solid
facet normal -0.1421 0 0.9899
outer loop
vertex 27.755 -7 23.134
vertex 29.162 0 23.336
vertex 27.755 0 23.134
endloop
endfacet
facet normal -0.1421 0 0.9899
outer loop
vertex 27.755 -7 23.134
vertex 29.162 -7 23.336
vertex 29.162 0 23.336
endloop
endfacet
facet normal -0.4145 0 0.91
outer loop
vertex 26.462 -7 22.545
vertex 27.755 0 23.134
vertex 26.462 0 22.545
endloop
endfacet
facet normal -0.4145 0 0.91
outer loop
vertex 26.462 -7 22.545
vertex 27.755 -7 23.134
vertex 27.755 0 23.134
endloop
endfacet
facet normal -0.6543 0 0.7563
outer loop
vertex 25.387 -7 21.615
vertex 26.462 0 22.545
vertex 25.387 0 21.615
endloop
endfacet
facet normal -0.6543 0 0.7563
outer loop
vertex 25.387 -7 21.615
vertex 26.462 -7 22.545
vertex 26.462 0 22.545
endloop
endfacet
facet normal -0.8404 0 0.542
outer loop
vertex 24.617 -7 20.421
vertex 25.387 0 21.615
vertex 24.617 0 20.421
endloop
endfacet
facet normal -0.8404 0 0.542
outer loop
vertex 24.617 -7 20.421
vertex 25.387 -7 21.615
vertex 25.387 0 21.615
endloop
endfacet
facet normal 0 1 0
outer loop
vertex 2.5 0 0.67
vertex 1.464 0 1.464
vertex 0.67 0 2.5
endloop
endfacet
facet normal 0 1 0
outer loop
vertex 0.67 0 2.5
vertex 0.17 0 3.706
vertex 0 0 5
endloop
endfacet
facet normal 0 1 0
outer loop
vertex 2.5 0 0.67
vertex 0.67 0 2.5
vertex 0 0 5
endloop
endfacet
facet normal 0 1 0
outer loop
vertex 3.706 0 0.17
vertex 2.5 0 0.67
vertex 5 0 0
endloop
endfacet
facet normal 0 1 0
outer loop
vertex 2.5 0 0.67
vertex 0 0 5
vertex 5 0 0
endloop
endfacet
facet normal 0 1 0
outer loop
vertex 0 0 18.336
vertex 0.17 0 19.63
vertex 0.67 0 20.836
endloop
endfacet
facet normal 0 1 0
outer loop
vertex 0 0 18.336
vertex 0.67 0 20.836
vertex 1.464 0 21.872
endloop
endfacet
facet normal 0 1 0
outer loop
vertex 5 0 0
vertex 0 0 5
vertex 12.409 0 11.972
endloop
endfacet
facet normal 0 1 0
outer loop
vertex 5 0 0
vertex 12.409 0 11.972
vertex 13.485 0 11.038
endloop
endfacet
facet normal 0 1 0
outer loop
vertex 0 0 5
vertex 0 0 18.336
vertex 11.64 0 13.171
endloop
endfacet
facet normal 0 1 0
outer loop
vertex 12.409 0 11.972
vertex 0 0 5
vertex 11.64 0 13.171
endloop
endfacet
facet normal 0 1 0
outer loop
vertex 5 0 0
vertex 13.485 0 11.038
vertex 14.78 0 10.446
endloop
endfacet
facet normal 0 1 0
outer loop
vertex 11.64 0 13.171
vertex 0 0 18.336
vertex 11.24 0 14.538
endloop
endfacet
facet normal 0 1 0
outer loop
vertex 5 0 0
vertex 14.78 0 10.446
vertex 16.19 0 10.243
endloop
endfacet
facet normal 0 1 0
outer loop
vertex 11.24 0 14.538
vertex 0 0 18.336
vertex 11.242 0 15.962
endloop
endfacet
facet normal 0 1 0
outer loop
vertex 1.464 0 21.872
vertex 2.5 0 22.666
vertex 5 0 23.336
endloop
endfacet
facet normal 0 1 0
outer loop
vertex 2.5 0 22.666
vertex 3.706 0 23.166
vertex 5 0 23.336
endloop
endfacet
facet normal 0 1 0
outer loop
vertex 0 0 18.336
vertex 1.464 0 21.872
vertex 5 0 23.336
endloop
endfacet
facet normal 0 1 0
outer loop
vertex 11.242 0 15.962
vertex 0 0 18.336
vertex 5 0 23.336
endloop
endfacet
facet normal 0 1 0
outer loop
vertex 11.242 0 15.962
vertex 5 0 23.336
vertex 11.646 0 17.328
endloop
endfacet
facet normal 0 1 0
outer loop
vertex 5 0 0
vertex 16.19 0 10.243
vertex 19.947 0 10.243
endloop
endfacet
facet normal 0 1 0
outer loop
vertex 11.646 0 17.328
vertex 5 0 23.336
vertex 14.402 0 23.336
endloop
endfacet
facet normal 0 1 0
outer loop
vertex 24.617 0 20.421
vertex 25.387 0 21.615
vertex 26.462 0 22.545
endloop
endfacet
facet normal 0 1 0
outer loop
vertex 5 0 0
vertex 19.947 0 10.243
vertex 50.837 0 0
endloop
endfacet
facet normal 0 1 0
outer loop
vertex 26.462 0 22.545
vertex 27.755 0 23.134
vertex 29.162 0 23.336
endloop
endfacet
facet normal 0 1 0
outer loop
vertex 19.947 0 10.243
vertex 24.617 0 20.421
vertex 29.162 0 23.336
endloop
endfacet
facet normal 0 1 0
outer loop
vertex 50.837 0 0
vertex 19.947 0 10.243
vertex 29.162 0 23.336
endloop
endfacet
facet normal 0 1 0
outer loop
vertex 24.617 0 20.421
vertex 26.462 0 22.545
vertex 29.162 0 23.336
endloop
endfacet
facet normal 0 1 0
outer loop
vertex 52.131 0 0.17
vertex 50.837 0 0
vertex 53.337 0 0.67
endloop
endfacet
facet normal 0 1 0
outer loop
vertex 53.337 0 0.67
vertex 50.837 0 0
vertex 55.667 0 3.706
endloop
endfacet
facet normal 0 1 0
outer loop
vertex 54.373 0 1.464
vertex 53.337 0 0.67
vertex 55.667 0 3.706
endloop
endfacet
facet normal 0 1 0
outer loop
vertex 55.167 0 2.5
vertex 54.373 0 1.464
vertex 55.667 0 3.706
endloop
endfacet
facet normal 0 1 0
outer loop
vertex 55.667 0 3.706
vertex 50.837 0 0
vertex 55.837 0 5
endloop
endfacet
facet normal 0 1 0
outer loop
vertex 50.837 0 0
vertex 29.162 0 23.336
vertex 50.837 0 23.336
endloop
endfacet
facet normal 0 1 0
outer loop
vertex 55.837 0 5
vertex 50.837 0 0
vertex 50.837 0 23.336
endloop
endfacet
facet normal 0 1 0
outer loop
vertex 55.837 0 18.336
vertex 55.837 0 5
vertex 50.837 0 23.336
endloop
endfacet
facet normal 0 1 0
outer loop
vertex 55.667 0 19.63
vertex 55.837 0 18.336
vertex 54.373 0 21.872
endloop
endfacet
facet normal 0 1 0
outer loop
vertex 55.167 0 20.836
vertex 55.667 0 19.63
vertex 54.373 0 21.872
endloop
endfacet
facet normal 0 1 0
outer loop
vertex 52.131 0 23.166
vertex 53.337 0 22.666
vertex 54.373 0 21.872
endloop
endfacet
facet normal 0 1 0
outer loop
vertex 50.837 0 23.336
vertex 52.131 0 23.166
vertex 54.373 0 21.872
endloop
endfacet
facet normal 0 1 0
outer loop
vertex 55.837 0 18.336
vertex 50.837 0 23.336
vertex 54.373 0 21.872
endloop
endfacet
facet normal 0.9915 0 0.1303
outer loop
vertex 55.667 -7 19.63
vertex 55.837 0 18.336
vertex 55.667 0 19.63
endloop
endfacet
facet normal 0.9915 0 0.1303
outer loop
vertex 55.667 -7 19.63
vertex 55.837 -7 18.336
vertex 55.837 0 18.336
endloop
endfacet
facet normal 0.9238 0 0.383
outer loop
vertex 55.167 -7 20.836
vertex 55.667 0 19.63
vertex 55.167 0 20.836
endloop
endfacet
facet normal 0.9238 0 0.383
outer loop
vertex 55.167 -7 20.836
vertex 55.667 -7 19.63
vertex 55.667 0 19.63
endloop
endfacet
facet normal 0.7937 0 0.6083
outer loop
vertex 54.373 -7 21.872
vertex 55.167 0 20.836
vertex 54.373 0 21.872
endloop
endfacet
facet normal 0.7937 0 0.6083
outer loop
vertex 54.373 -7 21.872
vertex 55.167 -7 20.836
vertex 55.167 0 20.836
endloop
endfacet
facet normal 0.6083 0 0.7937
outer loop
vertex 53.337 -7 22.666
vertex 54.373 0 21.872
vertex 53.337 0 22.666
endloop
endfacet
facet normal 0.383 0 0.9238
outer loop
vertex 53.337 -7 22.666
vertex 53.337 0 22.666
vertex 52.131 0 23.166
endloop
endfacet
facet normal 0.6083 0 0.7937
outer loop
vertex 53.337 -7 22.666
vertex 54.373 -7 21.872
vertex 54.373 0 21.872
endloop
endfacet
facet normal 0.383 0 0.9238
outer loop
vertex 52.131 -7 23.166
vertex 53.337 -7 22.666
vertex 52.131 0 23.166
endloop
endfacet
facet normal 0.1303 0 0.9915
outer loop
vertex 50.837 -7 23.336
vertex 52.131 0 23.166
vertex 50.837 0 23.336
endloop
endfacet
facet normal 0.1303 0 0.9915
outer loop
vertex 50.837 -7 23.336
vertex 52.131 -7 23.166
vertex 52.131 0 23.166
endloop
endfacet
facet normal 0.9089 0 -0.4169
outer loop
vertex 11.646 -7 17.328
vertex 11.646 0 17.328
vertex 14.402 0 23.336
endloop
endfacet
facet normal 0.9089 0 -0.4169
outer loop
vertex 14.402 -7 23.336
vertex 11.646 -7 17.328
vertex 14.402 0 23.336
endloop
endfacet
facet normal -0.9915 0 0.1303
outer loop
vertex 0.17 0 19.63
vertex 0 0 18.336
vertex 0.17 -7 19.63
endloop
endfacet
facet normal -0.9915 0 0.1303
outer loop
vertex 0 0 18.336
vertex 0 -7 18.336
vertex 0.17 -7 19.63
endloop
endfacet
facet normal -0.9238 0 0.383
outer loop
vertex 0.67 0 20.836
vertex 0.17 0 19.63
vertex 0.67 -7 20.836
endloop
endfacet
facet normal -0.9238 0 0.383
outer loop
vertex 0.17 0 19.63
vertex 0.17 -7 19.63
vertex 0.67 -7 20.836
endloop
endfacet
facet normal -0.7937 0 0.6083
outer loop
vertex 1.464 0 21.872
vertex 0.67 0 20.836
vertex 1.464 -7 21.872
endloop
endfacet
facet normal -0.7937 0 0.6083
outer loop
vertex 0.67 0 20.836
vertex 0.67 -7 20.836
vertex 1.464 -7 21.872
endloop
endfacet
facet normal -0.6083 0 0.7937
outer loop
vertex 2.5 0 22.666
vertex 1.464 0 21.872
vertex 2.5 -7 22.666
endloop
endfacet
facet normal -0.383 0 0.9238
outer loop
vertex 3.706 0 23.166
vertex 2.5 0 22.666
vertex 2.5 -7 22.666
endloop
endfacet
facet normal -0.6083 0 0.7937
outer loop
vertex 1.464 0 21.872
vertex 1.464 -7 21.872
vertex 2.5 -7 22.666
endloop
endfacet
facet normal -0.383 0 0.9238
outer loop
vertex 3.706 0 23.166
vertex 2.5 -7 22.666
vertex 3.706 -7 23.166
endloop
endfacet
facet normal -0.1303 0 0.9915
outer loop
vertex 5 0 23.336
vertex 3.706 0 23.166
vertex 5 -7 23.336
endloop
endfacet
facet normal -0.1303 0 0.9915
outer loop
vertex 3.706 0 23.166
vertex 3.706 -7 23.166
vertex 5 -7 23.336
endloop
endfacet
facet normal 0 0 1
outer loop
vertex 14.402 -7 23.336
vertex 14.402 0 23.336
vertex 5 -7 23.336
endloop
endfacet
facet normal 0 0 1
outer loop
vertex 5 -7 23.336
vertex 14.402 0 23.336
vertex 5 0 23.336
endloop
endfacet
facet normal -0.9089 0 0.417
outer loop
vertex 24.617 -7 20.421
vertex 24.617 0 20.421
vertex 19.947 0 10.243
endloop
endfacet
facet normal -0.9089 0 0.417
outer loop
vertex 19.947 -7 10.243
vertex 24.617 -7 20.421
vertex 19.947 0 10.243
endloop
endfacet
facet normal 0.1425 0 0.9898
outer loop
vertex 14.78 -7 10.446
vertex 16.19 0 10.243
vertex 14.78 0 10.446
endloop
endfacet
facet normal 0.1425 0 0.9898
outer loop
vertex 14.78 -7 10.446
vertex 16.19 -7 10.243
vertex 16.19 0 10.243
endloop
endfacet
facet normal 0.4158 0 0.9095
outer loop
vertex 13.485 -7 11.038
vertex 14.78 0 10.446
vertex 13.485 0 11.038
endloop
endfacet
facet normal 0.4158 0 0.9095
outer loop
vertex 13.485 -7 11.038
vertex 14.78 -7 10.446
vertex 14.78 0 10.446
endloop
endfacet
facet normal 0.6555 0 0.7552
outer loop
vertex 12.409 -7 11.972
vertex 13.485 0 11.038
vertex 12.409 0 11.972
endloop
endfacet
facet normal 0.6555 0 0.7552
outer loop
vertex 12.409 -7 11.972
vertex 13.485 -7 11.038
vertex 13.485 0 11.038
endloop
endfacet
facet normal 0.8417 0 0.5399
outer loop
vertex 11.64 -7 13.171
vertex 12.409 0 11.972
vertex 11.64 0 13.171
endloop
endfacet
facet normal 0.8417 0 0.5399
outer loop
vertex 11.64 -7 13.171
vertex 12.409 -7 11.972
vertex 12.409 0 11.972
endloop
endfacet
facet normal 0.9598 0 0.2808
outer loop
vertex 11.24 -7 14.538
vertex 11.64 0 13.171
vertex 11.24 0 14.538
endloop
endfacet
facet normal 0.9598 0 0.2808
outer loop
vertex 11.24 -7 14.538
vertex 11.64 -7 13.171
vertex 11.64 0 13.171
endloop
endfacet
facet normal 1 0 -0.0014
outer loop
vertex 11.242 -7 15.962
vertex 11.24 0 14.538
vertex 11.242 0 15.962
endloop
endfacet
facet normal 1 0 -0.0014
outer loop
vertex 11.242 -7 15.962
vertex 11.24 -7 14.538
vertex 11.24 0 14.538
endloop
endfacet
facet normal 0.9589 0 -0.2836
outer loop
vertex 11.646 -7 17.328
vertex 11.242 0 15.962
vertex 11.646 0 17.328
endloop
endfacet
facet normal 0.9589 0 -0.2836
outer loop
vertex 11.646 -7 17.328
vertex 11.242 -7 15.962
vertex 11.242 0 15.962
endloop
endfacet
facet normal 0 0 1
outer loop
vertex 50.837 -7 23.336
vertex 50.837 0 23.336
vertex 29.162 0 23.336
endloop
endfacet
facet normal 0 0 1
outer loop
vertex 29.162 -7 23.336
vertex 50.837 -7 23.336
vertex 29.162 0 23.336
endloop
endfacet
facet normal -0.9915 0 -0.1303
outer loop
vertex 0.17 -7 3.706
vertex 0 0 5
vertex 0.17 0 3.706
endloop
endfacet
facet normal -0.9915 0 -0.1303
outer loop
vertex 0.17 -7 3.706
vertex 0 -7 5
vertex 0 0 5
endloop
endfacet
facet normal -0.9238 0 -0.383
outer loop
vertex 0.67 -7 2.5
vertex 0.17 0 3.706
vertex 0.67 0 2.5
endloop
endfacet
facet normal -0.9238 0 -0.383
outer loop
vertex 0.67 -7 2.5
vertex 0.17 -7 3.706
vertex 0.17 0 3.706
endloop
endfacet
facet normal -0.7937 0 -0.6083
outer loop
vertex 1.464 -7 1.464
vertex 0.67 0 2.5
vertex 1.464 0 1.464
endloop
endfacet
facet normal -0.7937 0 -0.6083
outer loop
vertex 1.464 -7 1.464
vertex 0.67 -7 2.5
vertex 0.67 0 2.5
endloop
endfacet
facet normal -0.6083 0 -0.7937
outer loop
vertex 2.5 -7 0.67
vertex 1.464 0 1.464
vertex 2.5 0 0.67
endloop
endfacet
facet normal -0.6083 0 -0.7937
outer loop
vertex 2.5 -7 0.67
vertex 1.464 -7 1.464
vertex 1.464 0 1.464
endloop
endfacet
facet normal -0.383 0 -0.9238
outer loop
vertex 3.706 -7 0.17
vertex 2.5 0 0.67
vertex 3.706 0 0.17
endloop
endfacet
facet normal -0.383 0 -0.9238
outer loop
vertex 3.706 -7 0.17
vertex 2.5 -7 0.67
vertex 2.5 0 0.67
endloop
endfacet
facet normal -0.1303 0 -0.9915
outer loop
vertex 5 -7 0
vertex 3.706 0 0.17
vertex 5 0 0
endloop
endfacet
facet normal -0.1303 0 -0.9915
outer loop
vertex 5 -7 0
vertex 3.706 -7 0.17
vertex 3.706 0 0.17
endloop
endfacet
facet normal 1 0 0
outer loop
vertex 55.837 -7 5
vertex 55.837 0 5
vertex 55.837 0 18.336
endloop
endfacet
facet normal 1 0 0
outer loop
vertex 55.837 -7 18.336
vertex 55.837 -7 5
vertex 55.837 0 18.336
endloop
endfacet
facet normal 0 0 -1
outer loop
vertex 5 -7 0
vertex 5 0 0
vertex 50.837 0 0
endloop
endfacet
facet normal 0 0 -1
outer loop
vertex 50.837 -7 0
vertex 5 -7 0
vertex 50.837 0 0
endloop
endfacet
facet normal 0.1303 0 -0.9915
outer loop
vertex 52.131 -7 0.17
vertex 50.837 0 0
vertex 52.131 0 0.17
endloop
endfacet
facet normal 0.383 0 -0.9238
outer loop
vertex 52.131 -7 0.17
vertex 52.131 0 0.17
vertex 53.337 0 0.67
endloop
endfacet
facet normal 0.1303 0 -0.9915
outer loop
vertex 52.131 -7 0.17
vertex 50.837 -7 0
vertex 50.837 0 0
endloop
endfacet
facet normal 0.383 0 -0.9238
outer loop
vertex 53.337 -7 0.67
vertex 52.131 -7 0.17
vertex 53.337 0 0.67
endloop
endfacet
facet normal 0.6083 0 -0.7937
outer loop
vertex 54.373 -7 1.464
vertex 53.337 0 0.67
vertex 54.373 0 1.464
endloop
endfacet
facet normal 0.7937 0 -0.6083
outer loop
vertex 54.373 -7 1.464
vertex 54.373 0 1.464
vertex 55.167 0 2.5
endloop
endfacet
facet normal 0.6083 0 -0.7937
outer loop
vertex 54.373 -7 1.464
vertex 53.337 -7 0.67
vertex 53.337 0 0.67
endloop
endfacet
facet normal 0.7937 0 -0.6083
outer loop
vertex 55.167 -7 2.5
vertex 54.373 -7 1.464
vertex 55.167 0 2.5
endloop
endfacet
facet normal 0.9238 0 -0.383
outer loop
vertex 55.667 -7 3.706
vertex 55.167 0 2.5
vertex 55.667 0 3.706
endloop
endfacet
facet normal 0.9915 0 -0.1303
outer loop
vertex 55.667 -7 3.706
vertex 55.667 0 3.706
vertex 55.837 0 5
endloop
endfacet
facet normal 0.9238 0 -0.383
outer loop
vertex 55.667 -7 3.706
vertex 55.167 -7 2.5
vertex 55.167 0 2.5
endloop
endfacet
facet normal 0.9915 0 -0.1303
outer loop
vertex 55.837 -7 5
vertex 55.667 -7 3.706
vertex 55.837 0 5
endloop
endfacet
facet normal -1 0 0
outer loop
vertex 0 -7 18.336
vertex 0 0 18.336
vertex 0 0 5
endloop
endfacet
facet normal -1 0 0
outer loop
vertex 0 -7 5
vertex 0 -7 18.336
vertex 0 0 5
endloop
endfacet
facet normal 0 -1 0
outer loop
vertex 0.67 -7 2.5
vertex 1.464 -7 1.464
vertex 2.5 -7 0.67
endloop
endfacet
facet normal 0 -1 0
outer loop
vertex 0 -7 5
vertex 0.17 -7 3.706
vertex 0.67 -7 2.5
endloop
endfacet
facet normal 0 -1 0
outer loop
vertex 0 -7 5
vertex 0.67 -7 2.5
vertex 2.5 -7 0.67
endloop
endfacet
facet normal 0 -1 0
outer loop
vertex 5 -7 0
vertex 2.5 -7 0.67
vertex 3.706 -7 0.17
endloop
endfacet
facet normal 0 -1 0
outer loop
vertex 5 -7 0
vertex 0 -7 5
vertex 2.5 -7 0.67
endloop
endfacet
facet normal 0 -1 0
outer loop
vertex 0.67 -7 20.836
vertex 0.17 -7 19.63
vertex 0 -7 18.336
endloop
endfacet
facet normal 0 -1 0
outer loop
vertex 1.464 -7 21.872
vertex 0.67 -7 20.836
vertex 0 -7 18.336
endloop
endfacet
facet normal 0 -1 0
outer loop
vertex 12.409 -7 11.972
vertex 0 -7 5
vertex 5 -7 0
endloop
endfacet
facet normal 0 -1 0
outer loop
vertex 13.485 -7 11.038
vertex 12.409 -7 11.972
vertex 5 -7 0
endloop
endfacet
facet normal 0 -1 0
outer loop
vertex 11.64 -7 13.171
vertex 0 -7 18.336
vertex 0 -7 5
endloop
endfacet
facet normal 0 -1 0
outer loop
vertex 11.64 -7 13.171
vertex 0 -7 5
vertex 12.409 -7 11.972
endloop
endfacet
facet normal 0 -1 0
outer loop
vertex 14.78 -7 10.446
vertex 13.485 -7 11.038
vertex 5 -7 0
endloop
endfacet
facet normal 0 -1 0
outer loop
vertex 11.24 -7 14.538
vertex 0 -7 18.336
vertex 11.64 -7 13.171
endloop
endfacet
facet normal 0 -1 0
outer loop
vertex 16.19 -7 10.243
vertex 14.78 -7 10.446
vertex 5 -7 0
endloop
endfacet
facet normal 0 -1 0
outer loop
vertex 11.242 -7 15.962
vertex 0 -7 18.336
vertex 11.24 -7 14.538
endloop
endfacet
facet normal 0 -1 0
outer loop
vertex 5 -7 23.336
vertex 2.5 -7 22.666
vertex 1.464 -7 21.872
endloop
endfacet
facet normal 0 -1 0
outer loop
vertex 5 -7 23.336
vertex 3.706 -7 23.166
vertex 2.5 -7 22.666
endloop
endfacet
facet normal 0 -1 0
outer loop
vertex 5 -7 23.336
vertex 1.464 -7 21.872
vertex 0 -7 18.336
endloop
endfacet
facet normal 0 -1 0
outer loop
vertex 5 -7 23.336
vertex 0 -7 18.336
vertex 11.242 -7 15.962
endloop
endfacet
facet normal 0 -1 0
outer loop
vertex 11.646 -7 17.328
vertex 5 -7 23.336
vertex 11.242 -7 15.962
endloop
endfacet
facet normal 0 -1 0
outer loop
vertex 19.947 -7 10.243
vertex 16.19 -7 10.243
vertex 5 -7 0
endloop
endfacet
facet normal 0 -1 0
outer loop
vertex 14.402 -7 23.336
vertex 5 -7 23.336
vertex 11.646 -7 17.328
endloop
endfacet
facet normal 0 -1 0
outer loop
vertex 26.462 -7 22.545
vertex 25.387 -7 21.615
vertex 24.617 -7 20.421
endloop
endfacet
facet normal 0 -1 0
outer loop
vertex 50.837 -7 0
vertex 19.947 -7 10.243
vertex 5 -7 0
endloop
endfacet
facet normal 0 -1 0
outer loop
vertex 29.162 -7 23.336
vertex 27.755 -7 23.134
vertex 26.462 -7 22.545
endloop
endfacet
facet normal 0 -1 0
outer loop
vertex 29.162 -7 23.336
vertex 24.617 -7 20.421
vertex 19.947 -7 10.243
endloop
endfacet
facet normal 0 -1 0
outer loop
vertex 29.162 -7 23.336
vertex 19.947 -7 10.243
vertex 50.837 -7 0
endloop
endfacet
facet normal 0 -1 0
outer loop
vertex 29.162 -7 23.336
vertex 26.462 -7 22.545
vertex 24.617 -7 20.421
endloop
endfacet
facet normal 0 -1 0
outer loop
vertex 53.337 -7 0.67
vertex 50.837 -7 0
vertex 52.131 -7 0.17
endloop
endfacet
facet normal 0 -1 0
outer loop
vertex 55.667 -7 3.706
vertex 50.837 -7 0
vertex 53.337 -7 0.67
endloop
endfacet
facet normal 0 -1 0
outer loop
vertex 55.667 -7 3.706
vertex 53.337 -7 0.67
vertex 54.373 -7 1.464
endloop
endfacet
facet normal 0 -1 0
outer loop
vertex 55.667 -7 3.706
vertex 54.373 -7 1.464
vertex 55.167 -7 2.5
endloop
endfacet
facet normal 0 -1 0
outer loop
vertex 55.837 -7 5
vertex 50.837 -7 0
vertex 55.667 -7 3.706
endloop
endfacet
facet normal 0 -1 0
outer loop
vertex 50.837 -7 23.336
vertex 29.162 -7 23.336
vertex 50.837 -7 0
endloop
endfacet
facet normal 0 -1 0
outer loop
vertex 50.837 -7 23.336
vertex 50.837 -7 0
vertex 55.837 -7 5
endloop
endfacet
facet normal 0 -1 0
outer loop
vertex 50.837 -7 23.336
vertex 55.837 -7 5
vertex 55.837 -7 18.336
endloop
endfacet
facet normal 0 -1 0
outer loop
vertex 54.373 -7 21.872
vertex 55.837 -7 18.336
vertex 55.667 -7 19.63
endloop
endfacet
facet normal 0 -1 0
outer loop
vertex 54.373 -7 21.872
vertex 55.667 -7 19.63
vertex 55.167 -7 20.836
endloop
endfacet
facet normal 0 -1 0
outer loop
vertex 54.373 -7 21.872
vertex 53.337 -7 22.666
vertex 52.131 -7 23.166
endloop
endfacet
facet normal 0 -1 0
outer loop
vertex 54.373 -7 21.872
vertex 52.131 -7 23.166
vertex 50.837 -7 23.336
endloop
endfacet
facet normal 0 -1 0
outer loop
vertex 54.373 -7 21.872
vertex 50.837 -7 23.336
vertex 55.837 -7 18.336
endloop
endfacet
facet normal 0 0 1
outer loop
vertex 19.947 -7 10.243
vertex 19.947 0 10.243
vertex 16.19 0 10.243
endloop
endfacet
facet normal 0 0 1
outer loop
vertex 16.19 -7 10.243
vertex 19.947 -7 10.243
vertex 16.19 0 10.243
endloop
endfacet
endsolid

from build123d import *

# Parameters (mm, degrees)
F1_DEPTH = 7
F2_R     = 5


with BuildPart() as f1:
    # F0 (on Front) → F1 (new body)
    with BuildSketch(Plane.XZ):
        Polygon((0, 23.336001), (0, 0), (55.836968, 0), (55.836968, 23.336001), (25.954563, 23.336001), (19.947276, 10.243195), (8.394799, 10.243195), (14.402086, 23.336001), align=None)
    extrude(amount=F1_DEPTH)

    # F2
    f2_edges = [f1.edges().sort_by_distance(p)[0] for p in [
        (55.836968, -3.5, 23.336001),
        (55.836968, -3.5, 0),
        (25.954563, -3.5, 23.336001),
        (0, -3.5, 0),
        (8.394799, -3.5, 10.243195),
        (0, -3.5, 23.336001),
    ]]
    fillet(f2_edges, radius=F2_R)


solid = f1.part
